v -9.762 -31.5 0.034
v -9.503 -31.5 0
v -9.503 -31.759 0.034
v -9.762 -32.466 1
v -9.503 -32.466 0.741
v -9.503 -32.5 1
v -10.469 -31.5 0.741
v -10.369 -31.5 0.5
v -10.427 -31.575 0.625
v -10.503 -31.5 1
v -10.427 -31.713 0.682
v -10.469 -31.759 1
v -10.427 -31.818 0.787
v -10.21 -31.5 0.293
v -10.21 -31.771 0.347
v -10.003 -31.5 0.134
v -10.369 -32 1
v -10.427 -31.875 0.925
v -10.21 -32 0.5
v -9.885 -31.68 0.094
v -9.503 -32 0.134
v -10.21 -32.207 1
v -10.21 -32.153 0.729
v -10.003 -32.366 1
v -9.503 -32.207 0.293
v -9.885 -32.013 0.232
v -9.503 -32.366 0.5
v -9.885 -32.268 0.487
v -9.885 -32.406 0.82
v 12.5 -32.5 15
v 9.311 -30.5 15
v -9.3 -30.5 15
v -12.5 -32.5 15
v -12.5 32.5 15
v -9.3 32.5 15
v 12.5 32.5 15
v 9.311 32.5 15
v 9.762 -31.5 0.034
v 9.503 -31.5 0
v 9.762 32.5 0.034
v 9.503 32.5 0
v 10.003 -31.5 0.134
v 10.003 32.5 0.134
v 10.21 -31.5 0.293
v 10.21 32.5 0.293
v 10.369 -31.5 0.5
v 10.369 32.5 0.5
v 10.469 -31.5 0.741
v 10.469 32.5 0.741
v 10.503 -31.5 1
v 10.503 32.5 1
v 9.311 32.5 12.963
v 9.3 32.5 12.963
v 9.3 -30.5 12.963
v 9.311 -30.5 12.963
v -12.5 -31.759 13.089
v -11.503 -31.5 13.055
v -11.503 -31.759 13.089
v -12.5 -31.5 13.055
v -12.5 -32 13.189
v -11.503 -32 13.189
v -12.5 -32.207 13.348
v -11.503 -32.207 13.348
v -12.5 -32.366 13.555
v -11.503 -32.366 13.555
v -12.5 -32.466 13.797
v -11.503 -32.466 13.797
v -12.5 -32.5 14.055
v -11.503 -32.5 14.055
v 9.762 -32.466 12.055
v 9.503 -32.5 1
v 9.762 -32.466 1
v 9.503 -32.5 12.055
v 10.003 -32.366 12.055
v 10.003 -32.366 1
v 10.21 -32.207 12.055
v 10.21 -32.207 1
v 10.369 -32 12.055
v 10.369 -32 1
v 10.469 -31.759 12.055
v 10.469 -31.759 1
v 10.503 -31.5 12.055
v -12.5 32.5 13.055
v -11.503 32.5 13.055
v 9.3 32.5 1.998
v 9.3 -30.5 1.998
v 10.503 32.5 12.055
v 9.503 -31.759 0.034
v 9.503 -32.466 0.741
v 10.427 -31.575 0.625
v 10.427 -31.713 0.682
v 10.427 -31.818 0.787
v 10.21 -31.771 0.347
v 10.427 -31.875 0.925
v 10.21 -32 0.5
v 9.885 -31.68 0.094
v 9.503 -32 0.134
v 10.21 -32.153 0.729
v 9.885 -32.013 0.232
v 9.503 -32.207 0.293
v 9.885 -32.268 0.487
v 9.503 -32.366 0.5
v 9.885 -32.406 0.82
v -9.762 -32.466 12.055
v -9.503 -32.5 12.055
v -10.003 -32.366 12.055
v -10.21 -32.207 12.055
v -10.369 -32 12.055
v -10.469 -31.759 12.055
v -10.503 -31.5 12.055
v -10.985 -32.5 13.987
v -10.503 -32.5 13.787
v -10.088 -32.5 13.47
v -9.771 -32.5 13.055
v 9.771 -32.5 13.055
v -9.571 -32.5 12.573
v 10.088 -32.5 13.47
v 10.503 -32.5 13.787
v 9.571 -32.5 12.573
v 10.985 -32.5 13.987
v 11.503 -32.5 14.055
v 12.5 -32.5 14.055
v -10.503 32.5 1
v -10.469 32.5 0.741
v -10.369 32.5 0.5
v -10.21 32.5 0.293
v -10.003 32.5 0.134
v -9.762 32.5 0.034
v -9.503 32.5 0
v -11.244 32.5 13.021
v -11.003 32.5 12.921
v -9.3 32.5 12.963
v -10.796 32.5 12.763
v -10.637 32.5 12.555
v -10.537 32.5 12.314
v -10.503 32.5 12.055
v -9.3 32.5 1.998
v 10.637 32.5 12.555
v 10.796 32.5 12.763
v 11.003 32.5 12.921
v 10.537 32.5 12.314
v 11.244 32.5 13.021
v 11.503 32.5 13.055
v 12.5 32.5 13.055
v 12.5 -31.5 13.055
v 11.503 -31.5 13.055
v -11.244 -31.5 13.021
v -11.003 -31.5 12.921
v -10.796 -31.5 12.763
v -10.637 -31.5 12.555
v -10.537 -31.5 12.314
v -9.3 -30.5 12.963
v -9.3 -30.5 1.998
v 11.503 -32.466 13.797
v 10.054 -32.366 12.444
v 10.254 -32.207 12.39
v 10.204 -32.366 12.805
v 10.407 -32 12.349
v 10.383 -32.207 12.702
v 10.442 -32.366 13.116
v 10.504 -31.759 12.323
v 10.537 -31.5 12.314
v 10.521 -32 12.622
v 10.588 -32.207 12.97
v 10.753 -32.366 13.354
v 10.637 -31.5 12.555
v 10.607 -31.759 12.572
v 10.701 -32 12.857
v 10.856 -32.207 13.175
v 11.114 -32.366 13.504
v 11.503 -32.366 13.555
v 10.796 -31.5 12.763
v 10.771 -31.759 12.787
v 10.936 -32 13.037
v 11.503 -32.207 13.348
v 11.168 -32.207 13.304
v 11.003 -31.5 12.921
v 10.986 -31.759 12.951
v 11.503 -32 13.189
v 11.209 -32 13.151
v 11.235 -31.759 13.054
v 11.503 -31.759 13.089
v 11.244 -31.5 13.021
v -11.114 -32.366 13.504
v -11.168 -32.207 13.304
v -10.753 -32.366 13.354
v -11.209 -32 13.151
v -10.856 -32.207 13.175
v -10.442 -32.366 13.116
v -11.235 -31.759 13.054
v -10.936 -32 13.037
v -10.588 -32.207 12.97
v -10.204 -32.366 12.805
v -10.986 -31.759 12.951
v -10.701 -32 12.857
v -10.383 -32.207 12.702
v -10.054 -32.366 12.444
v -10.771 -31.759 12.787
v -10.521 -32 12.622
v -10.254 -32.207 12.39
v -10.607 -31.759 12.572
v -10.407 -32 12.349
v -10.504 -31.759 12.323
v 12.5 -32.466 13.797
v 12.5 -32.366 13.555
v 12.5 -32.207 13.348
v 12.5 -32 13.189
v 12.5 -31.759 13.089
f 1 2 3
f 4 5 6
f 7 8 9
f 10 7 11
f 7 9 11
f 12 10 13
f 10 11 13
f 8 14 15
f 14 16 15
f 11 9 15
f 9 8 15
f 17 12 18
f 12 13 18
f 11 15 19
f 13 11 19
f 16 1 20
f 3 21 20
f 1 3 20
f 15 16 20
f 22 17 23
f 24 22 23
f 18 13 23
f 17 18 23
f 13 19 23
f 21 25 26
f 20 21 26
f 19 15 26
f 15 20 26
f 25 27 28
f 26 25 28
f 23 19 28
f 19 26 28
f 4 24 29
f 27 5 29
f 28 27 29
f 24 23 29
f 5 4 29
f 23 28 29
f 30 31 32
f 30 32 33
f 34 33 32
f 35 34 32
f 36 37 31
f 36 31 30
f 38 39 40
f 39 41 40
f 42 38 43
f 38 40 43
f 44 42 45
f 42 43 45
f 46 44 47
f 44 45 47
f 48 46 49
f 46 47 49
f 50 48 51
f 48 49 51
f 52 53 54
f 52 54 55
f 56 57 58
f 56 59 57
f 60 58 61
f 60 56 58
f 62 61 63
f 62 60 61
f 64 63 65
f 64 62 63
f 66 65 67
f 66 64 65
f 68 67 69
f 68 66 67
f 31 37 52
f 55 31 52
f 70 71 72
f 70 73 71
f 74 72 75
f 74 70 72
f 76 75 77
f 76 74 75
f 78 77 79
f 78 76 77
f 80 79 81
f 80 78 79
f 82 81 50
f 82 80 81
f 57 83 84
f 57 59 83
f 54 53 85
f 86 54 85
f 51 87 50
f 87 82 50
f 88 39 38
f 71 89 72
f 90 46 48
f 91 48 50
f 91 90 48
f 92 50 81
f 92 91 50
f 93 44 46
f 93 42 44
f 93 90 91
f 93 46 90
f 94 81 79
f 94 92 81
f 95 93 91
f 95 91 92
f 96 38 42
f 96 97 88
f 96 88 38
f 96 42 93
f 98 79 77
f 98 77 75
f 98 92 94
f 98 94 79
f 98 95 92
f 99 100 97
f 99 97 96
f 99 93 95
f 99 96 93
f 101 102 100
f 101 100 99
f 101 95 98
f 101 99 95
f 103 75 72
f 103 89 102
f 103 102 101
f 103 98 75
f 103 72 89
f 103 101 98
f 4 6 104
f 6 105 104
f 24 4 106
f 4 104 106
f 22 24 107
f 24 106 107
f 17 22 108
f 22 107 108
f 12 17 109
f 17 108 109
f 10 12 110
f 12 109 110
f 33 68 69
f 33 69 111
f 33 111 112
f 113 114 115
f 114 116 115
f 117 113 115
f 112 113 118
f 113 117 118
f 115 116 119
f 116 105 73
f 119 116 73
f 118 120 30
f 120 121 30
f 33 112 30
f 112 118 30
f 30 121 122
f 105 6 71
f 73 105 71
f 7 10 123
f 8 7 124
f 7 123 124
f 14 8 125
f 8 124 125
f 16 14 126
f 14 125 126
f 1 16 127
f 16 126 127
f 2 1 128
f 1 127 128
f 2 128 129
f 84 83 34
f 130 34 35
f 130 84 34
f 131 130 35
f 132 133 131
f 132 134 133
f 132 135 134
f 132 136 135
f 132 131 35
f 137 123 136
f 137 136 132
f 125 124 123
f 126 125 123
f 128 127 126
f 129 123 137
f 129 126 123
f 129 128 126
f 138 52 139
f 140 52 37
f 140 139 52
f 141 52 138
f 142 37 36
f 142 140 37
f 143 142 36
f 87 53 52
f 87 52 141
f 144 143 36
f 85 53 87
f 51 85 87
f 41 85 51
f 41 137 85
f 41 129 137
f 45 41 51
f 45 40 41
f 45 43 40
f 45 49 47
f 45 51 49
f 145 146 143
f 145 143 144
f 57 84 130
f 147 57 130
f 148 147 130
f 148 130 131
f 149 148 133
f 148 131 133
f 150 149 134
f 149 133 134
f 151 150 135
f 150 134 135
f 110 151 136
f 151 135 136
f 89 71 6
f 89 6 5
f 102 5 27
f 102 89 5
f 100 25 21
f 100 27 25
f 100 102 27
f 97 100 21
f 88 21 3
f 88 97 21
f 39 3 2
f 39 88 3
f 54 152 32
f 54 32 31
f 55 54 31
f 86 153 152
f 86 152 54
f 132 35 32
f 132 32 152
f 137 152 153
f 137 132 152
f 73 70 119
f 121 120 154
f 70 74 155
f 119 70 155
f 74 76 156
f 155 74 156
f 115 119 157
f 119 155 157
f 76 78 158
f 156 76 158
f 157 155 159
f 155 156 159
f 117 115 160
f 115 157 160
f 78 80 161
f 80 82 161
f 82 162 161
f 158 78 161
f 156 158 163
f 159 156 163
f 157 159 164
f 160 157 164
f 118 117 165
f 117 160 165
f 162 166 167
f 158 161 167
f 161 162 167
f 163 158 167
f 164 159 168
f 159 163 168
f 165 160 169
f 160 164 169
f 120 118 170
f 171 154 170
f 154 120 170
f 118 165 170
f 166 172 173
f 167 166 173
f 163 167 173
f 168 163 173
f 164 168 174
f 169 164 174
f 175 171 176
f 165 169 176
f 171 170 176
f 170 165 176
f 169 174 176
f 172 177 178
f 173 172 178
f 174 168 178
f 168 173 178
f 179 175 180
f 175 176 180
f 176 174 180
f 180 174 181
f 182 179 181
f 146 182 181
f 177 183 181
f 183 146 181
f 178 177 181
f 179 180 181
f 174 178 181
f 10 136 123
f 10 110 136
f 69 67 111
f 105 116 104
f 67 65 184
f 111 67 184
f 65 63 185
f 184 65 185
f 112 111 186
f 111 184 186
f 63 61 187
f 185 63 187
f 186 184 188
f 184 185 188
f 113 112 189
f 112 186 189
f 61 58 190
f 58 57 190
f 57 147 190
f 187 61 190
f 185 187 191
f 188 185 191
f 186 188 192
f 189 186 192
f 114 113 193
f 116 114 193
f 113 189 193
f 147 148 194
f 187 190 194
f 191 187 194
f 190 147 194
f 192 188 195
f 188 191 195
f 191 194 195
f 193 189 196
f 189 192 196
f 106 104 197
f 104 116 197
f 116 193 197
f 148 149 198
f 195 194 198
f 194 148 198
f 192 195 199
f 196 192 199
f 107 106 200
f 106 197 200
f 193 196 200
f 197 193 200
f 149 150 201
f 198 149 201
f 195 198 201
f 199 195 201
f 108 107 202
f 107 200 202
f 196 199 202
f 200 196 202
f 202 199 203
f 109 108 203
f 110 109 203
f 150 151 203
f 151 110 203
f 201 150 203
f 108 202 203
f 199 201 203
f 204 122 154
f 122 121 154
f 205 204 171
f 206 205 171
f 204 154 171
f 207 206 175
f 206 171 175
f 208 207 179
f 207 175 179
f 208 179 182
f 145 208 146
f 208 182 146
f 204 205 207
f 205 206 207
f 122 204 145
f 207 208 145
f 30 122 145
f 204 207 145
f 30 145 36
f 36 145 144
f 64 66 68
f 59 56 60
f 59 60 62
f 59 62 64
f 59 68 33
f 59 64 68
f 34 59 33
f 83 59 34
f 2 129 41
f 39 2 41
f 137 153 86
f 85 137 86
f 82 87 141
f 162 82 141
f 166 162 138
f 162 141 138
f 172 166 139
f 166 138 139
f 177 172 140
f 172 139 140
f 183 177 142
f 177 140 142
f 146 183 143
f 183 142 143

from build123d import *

# Parameters (mm, degrees)
ESQUISSE1_W                  = 25
ESQUISSE1_H                  = 65
BOSS_EXTRU_1_DEPTH           = 15
ENL_V_MAT_EXTRU_1_DEPTH      = 68.869359802
ENL_V_MAT_EXTRU_1_DEPTH_BACK = 68.869359802
ESQUISSE2_W                  = 1.99730465
ESQUISSE2_H                  = 13.055396478
ESQUISSE3_W                  = 18.6
ESQUISSE3_H                  = 10.964826829
ENL_V_MAT_EXTRU_2_DEPTH      = 63
ESQUISSE4_W                  = 18.610580781
ESQUISSE4_H                  = 2.037454763
ENL_V_MAT_EXTRU_3_DEPTH      = 63
CONG_1_R                     = 1


with BuildPart() as part:
    # Esquisse1 → Boss.-Extru.1 (new body)
    with BuildSketch(Plane.XY):
        Rectangle(ESQUISSE1_W, ESQUISSE1_H)
    extrude(amount=BOSS_EXTRU_1_DEPTH)

    # Esquisse2 → Enlèv. mat.-Extru.1 (cut, two sides: drawn at the far end of the back side and taken through both)
    with BuildSketch(Plane(origin=(0, 32.5, 0), x_dir=(1, 0, 0), z_dir=(0, 1, 0)).offset(-ENL_V_MAT_EXTRU_1_DEPTH_BACK)):
        with Locations((11.501347675, -6.527698239)):
            Rectangle(ESQUISSE2_W, ESQUISSE2_H)
        with Locations((-11.501347675, -6.527698239)):
            Rectangle(ESQUISSE2_W, ESQUISSE2_H)
    extrude(amount=ENL_V_MAT_EXTRU_1_DEPTH + ENL_V_MAT_EXTRU_1_DEPTH_BACK, mode=Mode.SUBTRACT)

    # Esquisse3 → Enlèv. mat.-Extru.2 (cut)
    with BuildSketch(Plane(origin=(0, 32.5, 0), x_dir=(1, 0, 0), z_dir=(0, 1, 0))):
        with Locations((0, -7.480131823)):
            Rectangle(ESQUISSE3_W, ESQUISSE3_H)
    extrude(amount=-ENL_V_MAT_EXTRU_2_DEPTH, mode=Mode.SUBTRACT)

    # Esquisse4 → Enlèv. mat.-Extru.3 (cut)
    with BuildSketch(Plane(origin=(0, 32.5, 0), x_dir=(1, 0, 0), z_dir=(0, 1, 0))):
        with Locations((0.00529039, -13.981272619)):
            Rectangle(ESQUISSE4_W, ESQUISSE4_H)
    extrude(amount=-ENL_V_MAT_EXTRU_3_DEPTH, mode=Mode.SUBTRACT)

    # Congé1
    cong_1_edges = [part.edges().sort_by_distance(p)[0] for p in [
        (0, -32.5, 0),
        (-10.50269535, 0, 13.055396478),
        (-11.501347675, -32.5, 13.055396478),
        (-10.50269535, 0, 0),
        (-10.50269535, -32.5, 6.527698239),
        (10.50269535, 0, 0),
        (11.501347675, -32.5, 13.055396478),
        (10.50269535, 0, 13.055396478),
        (10.50269535, -32.5, 6.527698239),
    ]]
    fillet(cong_1_edges, radius=CONG_1_R)


solid = part.part
